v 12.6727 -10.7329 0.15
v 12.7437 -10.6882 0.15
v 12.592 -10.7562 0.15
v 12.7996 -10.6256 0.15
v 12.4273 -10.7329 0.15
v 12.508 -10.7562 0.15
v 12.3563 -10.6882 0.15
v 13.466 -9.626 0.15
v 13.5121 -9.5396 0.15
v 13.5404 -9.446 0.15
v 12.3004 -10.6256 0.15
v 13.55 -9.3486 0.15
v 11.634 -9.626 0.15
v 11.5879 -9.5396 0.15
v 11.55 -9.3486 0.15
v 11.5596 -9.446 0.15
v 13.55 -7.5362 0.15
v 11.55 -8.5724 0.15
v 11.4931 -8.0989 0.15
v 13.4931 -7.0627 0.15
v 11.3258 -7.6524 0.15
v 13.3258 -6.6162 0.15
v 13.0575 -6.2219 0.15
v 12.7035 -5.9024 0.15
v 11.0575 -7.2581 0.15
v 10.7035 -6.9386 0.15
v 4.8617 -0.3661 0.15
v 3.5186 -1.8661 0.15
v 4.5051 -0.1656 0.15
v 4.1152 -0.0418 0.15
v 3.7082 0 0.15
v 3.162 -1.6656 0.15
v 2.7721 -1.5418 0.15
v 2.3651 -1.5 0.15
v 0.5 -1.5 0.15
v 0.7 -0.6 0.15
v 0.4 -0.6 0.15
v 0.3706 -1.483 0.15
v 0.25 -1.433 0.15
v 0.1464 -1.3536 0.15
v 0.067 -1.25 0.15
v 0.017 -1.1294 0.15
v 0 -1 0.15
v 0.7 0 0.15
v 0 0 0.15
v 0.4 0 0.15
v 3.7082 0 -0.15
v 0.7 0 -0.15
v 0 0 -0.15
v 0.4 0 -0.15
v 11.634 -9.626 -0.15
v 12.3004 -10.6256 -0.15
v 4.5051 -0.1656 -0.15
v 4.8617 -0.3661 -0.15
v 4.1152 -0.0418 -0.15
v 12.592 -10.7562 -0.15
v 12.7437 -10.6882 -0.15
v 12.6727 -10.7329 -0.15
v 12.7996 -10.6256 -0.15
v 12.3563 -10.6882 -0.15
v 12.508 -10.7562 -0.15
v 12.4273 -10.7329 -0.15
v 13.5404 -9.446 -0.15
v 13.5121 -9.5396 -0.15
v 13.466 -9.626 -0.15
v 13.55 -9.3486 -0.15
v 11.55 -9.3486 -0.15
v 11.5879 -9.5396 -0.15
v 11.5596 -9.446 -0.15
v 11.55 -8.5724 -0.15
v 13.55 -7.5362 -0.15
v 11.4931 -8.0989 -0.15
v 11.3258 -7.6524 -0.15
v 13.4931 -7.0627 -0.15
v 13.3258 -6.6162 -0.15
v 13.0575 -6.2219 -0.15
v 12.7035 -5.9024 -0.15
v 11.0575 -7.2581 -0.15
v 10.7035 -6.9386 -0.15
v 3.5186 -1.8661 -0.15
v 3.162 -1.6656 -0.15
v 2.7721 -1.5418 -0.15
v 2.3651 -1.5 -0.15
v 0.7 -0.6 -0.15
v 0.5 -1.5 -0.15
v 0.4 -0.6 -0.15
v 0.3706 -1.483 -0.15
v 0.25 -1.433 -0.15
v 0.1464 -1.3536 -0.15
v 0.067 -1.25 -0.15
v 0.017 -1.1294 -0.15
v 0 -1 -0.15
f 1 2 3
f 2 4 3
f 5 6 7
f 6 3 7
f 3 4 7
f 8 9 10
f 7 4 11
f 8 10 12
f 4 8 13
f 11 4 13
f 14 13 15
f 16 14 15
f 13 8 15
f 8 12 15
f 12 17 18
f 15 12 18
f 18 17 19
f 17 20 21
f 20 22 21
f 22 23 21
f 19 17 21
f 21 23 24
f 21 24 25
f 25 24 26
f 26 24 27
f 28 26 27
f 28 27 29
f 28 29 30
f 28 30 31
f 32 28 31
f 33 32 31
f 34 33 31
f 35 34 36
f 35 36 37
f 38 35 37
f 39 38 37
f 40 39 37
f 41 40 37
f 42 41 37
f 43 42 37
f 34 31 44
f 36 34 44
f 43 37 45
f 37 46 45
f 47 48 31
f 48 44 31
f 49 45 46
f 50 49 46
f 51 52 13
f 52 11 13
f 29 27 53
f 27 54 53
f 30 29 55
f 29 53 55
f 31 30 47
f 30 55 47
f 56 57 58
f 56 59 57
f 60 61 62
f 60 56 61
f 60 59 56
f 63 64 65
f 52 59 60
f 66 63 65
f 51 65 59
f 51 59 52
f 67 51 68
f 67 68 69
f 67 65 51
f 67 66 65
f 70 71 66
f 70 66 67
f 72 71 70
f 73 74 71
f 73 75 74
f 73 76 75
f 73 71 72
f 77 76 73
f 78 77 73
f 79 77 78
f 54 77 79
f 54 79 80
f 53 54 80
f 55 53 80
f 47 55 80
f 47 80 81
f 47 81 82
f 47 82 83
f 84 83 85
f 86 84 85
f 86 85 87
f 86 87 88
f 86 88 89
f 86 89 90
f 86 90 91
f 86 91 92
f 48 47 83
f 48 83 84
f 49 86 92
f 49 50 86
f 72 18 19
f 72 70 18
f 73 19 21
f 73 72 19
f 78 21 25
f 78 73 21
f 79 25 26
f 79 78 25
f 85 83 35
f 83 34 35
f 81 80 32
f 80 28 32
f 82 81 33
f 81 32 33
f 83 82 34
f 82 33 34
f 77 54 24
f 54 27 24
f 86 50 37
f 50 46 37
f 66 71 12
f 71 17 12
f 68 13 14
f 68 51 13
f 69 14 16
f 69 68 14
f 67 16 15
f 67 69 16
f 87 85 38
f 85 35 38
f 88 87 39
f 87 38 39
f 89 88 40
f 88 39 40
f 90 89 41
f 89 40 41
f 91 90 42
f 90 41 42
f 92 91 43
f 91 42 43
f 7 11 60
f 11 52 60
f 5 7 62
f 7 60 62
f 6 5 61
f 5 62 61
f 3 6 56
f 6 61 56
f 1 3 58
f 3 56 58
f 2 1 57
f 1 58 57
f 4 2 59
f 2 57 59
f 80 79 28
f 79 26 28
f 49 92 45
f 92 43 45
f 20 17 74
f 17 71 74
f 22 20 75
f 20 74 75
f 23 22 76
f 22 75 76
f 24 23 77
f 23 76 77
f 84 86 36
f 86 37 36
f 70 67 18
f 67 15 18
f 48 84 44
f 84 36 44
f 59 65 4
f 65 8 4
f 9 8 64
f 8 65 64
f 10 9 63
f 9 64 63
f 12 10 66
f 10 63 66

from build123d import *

# Parameters (mm, degrees)
BOSS_EXTRUDE1_DEPTH = 0.15
FILLET1_R           = 0.3
FILLET2_R           = 0.5
FILLET3_R           = 2


with BuildPart() as part:
    # Sketch1 → Boss-Extrude1 (new, symmetric)
    with BuildSketch(Plane.XY):
        Polygon((0, 0), (0.4, 0), (0.4, -0.6), (0.7, -0.6), (0.7, 0), (4.34307957, 0), (13.55, -6.5), (13.55, -9.5), (12.55, -11), (11.55, -9.5), (11.55, -7.5362203), (3, -1.5), (0, -1.5), align=None)
    extrude(amount=BOSS_EXTRUDE1_DEPTH, both=True)

    # Fillet1
    fillet1_edges = [part.edges().sort_by_distance(p)[0] for p in [
        (12.55, -11, 0),
    ]]
    fillet(fillet1_edges, radius=FILLET1_R)

    # Fillet2
    fillet2_edges = [part.edges().sort_by_distance(p)[0] for p in [
        (13.55, -9.5, 0),
        (11.55, -9.5, 0),
        (0, -1.5, 0),
    ]]
    fillet(fillet2_edges, radius=FILLET2_R)

    # Fillet3
    fillet3_edges = [part.edges().sort_by_distance(p)[0] for p in [
        (4.34307957, 0, 0),
        (13.55, -6.5, 0),
        (11.55, -7.5362203, 0),
        (3, -1.5, 0),
    ]]
    fillet(fillet3_edges, radius=FILLET3_R)


solid = part.part
